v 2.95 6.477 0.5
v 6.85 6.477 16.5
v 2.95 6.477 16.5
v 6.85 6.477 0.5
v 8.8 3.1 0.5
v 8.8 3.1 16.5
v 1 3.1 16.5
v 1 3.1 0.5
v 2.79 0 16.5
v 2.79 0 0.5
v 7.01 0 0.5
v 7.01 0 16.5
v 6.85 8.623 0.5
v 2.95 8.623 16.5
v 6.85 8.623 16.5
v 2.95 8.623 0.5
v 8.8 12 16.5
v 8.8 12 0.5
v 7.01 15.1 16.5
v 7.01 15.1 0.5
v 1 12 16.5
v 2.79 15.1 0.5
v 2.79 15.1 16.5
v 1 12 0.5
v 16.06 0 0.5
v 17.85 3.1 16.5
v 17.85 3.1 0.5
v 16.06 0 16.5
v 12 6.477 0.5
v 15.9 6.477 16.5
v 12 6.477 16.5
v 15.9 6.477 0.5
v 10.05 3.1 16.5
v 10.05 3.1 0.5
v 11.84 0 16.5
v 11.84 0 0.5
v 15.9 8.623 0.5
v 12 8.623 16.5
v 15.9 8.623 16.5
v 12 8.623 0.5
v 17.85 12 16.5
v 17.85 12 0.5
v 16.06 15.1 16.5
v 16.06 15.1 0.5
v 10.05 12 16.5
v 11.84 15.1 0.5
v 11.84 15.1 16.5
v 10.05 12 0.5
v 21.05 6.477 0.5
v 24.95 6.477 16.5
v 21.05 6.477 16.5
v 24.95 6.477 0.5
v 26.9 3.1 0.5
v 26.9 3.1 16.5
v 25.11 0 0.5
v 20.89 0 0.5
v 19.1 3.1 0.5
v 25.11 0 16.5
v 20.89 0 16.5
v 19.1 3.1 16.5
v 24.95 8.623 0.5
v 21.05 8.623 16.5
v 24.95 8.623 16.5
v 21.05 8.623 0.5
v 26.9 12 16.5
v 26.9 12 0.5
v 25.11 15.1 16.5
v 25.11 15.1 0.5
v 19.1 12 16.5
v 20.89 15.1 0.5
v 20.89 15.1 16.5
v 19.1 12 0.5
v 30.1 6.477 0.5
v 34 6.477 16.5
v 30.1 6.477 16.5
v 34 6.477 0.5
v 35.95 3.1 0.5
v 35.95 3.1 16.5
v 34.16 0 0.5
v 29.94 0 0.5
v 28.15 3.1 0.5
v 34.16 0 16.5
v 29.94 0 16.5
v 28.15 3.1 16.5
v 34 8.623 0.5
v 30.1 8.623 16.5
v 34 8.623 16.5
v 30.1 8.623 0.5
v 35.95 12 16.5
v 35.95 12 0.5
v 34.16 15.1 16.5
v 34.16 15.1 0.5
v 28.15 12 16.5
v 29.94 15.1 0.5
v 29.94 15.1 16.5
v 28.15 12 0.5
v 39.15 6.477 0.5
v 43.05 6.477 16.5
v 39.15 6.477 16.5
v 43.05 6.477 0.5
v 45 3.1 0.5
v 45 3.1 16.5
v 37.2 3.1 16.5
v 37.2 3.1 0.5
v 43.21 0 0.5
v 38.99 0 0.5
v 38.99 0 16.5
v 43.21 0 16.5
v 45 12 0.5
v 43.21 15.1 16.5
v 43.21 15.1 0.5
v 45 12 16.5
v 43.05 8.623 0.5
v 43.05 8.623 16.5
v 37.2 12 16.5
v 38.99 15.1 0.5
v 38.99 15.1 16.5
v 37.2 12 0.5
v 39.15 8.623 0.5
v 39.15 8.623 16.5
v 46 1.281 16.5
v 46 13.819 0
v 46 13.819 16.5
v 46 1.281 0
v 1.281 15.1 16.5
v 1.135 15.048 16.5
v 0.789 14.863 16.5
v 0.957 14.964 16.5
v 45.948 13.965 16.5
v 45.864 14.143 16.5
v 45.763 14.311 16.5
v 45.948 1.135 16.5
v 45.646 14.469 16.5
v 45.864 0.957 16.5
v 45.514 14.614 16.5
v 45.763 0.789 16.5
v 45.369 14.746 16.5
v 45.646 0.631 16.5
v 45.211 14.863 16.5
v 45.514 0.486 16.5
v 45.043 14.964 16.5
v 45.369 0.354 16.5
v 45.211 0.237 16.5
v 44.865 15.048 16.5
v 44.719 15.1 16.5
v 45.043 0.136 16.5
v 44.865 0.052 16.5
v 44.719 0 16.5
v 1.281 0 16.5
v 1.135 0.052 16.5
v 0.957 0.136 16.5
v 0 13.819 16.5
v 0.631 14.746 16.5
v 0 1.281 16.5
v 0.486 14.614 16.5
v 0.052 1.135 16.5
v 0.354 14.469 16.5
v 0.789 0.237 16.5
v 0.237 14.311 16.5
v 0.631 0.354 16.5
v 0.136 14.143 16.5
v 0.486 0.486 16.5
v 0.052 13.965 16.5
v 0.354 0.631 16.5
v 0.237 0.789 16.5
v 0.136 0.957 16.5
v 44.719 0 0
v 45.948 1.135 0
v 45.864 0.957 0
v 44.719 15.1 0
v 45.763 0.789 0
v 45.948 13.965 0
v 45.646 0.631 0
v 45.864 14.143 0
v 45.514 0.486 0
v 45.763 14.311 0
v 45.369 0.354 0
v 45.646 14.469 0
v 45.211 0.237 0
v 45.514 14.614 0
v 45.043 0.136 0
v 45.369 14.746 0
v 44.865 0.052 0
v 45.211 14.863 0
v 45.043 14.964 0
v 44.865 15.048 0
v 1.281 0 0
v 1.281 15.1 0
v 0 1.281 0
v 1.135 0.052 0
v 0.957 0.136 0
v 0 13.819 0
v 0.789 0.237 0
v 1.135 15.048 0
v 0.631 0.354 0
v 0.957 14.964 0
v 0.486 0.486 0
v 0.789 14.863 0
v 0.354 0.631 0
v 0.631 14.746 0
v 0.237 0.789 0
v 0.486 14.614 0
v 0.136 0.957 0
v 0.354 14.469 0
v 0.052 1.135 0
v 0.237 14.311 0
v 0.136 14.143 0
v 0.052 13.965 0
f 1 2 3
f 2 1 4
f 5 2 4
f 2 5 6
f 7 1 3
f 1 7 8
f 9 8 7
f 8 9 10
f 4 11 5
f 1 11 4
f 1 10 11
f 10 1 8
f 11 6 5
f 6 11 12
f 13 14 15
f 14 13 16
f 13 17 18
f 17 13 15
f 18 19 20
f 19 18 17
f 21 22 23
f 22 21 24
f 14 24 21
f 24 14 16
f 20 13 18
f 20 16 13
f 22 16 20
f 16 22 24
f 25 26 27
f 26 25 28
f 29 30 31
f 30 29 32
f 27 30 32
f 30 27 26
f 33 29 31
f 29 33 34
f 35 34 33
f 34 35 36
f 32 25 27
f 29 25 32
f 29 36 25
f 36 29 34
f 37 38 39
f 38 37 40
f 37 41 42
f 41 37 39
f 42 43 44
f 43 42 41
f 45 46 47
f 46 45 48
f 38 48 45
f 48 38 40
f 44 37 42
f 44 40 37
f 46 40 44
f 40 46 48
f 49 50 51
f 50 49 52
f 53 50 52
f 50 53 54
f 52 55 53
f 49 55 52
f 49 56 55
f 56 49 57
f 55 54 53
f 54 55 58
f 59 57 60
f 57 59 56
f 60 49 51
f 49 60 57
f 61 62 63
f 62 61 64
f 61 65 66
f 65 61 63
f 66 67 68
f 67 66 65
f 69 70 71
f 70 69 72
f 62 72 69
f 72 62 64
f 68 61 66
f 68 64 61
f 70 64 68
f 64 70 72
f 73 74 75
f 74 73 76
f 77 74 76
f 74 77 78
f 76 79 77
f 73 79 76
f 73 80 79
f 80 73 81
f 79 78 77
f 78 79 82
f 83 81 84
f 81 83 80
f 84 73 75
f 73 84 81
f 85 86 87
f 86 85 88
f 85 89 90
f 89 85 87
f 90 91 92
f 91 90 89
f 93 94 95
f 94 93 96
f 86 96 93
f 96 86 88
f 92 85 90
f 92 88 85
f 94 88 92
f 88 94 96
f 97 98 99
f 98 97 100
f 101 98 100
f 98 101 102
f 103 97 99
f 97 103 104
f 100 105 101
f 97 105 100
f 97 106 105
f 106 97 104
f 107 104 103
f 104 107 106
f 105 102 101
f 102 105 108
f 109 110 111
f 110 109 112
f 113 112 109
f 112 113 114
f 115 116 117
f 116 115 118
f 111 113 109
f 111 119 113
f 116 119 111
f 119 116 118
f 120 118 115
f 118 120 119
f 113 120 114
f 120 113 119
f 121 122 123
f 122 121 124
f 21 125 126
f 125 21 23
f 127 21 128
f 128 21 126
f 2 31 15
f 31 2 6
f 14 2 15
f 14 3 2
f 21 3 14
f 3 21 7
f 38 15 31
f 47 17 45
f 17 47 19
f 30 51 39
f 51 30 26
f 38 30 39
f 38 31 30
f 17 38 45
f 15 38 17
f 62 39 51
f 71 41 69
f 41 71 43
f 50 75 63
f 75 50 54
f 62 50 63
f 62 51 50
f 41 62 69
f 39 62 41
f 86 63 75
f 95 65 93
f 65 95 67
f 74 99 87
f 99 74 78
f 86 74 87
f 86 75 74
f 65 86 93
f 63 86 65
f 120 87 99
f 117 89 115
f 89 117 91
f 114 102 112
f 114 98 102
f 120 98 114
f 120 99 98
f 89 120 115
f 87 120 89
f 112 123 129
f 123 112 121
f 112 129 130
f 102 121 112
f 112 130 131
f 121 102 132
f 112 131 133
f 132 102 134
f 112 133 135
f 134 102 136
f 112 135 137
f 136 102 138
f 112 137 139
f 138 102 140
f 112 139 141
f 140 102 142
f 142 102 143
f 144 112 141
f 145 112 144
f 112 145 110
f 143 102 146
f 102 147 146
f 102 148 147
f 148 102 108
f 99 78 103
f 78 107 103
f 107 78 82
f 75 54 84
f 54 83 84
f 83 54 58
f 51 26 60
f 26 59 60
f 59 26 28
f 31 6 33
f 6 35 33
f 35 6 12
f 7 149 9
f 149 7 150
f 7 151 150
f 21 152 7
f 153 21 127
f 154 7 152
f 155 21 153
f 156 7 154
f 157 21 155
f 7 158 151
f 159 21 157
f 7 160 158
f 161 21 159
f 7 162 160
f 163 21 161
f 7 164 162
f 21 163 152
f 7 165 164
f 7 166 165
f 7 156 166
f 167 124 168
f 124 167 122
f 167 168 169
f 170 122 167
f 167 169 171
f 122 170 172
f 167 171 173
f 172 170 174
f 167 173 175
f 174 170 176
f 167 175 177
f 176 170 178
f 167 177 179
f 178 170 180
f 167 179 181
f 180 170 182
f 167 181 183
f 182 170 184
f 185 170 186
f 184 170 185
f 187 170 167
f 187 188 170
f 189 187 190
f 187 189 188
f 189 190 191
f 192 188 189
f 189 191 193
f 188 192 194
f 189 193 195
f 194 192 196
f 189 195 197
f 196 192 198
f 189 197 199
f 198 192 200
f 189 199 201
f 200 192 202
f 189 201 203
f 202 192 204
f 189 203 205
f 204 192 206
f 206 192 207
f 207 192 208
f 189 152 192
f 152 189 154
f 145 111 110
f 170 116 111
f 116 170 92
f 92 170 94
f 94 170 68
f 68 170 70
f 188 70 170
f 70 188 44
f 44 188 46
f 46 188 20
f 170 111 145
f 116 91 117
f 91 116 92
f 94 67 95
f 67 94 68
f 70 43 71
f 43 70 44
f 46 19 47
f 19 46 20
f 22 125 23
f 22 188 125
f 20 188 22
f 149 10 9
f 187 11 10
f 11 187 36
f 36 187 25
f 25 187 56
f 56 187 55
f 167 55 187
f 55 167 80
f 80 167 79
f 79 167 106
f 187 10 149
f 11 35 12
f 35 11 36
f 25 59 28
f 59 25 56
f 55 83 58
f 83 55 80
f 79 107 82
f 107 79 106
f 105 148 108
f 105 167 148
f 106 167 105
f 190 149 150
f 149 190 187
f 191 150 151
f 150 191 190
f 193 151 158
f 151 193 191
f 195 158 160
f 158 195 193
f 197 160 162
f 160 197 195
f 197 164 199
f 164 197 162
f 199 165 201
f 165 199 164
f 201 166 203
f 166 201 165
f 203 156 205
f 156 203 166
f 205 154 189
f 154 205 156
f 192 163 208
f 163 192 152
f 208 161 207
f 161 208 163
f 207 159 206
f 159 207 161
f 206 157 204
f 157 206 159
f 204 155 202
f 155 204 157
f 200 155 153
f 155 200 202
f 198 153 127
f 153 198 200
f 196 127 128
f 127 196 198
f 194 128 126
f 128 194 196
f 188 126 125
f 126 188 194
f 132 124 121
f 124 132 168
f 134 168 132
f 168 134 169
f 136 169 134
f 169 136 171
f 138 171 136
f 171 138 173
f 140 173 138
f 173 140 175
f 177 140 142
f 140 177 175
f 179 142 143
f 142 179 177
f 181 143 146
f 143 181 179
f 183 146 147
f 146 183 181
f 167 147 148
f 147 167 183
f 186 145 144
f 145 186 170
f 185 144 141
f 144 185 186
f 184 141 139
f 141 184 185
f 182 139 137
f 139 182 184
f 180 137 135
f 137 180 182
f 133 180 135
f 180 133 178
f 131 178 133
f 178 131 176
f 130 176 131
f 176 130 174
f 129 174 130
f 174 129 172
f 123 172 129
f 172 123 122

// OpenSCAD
/**
 * Remix of hex bit holder by TBRIshtar on Thingiverse:
 * http://www.thingiverse.com/thing:241501
 *
 * This remix mimics the original as close as possible but has the following
 * features:
 *  - Any number of rows and columns, still keeping the edge rows open on the
 *    sides. This is nice if the hex shank has the bit size stamped on it.
 *  - Footer height can be adjusted
 *  - Height can be adjusted
 *  - Gaps between rows and columns can be adjusted
 *  - Edge width can be adjusted
 *  - Hole size and round or hex shape can be set
 *
 * Author: Fitzterra <fitz_subs@icave.net>  - July 2016
 *
 * License:
 * This work is licensed under the Creative Commons Attribution-ShareAlike 3.0
 * Unported License. To view a copy of this license, visit
 * http://creativecommons.org/licenses/by-sa/3.0/ or send a letter to Creative
 * Commons, PO Box 1866, Mountain View, CA 94042, USA.
 **/

/**
 * This version is specifically for upload to Thingiverse and includes the
 * filleting function from jfhbrook's fillets (see below) library inline in
 * this file.
 * This is because on Thingiverse you can not use custom external scad files
 * when using the customizer.
 *
 * Fillets library from:
 * https://github.com/jfhbrook/openscad-fillets/blob/master/fillets.scad
 **/

// Number of rows
rows = 2;
// Number of columns
columns = 5;
// Height of the footer
foot = 0.5;
// Height above footer
height = 16;

/* [ Advanced ] */
// Gap between hole edges for rows
rowsGap = 1.1;
// Gap between hole edges for columns
colsGap = 1.25;
// How much space to leave on the columns edges - can be negative to open the hex hole edge.
colsEdge = 1.0;
// How much space on the row top and bottom.
rowsEdge = -0.8;
// Hole diameter
holeDia = 7.8;
// Hex or round hole?
holeShape = "hex"; //[hex, round]
// The corner fillet radius
fRad = 2.0;


/** Direct inclusion from fillets.scad **/
// 2d primitive for inside fillets.
module fil_2d_i(r, angle=90) {
  translate([r, r, 0])
  difference() {
    polygon([
      [0, 0],
      [0, -r],
      [-r * tan(angle/2), -r],
      [-r * sin(angle), -r * cos(angle)]
    ]);
    circle(r=r);
  }
}

/** Direct inclusion from fillets.scad **/
// 3d linear inside fillet.
module fil_linear_i(l, r, angle=90) {
  rotate([0, -90, 180]) {
    linear_extrude(height=l, center=false) {
      fil_2d_i(r, angle);
    }
  }
}

/**
 * Module to generate the bit holder
 *
 **/
module Holder() {
    // Nicely rounded fillets
    $fn=64;

    // Calculate the total width and depth
    w = columns*holeDia + (columns-1)*colsGap + colsEdge*2;
    d = rows*holeDia + (rows-1)*rowsGap + rowsEdge*2;

    // Apply a scaling if needed
    difference() {
        // The main block
        cube([w, d, foot+height]);
        // Sink the hex holes
        translate([colsEdge, rowsEdge, foot])
            for(x=[0:columns-1])
                for(y=[0:rows-1])
                    translate([x*(holeDia+colsGap)+holeDia/2, y*(holeDia+rowsGap)+holeDia/2, 0])
                        cylinder(d=holeDia, h=height+0.1, $fn=holeShape=="hex"?6:100);

        // Fillet the 4 corners
        translate([-0.1, -0.1, -0.1])
            rotate([0, -90, 180])
                fil_linear_i(foot+height+0.2, fRad);
        translate([-0.1, d+0.1, -0.1])
            rotate([0, -90, 90])
                fil_linear_i(foot+height+0.2, fRad);
        translate([w+0.1, -0.1, -0.1])
            rotate([0, -90, -90])
                fil_linear_i(foot+height+0.2, fRad);
        translate([w+0.1, d+0.1, -0.1])
            rotate([0, -90, 0])
                fil_linear_i(foot+height+0.2, fRad);
    }
}

Holder();
